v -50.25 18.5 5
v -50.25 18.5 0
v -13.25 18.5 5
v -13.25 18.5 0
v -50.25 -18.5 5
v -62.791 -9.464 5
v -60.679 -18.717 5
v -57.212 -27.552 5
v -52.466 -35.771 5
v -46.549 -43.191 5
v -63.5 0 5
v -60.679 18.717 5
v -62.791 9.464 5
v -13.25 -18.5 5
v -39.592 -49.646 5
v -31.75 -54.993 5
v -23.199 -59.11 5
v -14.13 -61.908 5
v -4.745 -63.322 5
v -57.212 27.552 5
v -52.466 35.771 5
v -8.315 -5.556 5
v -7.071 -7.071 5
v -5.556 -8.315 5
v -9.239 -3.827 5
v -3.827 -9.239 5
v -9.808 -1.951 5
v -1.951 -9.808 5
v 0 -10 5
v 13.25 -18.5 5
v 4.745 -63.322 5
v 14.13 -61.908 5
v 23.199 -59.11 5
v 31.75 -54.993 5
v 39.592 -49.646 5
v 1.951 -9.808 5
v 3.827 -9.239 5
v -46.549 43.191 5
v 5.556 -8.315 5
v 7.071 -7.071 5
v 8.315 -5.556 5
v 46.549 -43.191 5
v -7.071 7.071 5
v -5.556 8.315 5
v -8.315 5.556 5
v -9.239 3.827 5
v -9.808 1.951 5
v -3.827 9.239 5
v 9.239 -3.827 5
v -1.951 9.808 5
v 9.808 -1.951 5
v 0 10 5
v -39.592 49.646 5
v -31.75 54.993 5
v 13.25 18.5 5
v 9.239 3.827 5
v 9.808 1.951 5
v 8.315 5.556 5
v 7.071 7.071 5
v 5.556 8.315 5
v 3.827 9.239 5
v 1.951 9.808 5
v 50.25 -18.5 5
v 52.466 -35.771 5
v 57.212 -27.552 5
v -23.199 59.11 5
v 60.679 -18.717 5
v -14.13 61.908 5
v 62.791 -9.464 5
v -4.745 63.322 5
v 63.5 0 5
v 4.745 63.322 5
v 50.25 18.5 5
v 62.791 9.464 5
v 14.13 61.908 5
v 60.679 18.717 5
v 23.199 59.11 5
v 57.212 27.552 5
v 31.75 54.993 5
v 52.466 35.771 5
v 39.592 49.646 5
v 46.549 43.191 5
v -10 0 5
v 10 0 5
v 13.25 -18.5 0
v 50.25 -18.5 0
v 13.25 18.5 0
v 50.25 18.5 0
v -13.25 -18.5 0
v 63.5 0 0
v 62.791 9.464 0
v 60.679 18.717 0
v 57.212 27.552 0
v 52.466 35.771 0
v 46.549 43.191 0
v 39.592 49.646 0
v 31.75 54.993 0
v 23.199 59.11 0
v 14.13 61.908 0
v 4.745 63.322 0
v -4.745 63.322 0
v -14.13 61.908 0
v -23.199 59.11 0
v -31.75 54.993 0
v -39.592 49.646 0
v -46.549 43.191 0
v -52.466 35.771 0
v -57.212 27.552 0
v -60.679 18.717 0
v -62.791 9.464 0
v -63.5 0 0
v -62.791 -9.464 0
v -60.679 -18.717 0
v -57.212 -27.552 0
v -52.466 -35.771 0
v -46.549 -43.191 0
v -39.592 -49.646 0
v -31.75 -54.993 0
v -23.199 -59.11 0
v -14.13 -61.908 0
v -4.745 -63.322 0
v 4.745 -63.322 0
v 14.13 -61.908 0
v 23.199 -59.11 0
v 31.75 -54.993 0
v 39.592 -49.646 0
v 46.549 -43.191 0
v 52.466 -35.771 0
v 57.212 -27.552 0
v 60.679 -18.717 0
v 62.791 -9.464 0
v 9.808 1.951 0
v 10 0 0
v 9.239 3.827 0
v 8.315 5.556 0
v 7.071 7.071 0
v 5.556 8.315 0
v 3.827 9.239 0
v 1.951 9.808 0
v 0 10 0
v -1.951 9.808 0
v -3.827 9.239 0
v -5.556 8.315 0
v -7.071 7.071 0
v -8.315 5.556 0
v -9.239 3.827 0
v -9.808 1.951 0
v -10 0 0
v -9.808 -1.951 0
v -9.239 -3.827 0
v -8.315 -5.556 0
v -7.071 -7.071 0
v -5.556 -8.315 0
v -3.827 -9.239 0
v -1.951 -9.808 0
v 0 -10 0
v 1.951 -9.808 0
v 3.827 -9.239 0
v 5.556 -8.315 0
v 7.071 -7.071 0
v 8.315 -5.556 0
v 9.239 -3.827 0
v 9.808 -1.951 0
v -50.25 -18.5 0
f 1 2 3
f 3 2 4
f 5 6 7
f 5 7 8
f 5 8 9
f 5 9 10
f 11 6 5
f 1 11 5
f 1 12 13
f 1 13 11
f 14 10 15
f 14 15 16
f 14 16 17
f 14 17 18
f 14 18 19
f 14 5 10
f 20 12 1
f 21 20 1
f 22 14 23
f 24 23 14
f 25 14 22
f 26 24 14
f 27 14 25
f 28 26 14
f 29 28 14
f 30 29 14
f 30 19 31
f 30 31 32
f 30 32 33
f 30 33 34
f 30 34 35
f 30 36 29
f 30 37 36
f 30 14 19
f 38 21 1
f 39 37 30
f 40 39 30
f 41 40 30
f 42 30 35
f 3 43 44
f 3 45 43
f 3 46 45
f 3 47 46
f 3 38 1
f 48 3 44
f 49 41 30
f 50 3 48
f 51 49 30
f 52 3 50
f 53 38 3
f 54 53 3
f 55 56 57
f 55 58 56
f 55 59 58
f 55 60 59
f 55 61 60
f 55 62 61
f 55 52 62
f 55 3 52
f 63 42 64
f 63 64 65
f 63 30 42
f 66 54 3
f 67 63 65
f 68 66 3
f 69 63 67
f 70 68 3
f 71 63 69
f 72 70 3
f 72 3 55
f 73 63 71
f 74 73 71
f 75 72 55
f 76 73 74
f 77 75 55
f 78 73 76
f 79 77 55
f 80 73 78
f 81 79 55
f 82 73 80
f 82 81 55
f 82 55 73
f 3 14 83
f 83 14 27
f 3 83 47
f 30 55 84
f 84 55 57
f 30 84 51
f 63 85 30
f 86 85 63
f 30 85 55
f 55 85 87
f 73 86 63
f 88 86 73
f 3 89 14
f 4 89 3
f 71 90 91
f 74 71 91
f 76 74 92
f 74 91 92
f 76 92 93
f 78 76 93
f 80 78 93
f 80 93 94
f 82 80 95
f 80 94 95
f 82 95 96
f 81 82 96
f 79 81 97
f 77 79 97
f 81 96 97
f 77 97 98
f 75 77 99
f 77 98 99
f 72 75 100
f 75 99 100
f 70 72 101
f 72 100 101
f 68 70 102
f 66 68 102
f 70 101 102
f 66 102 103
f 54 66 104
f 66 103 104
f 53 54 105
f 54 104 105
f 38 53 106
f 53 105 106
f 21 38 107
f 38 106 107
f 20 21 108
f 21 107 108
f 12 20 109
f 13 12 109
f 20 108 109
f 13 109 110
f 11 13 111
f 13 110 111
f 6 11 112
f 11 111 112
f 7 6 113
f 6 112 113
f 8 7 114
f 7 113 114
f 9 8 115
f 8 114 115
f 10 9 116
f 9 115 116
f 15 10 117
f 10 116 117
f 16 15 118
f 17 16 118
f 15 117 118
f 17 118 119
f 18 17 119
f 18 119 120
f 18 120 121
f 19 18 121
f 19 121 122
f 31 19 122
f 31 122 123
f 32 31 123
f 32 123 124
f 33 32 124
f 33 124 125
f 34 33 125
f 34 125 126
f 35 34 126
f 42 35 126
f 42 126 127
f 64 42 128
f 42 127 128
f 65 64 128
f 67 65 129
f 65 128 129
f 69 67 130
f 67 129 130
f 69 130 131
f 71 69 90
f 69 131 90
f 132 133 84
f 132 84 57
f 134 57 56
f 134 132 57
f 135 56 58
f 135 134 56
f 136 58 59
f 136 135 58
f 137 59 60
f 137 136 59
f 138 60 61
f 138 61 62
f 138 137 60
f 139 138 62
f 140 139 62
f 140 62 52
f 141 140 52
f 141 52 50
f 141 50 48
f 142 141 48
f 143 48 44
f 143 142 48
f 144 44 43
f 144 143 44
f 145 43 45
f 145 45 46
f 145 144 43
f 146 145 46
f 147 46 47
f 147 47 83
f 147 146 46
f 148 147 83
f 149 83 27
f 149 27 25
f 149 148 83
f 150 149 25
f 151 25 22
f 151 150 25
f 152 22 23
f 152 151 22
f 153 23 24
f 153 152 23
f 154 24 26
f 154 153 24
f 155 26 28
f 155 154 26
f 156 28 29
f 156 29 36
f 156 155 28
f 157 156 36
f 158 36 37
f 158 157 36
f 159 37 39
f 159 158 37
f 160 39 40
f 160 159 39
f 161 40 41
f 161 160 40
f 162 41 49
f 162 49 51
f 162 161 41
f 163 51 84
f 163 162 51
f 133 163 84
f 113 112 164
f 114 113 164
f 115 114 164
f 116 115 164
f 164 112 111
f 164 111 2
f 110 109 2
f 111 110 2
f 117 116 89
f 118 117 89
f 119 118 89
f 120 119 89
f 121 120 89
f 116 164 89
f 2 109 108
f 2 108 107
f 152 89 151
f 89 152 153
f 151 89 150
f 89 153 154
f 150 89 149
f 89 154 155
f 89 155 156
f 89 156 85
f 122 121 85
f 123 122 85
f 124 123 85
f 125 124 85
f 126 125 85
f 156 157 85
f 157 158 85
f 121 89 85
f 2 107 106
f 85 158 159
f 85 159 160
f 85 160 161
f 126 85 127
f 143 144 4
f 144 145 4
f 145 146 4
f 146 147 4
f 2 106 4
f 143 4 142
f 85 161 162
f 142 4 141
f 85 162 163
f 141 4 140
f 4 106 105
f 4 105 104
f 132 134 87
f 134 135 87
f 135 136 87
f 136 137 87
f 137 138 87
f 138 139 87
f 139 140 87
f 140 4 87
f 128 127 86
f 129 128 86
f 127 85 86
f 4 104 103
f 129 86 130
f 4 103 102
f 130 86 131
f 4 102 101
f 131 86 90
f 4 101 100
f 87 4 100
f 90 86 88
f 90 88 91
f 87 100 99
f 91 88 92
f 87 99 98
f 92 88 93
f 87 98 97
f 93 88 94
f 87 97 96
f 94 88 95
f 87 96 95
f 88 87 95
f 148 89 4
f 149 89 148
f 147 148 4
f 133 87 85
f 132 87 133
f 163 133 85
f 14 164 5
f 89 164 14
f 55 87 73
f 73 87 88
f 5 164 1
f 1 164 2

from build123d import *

# Parameters (mm, degrees)
F0_R     = 63.5
F0_W     = 37
F0_H     = 37
F0_R_2   = 10
F1_DEPTH = 5


with BuildPart() as f1:
    # F0 (on Top) → F1 (new body)
    with BuildSketch(Plane.XY):
        Circle(F0_R)
        with Locations((-31.75, 0)):
            Rectangle(F0_W, F0_H, mode=Mode.SUBTRACT)
        Circle(F0_R_2, mode=Mode.SUBTRACT)
        with Locations((31.75, 0)):
            Rectangle(F0_W, F0_H, mode=Mode.SUBTRACT)
    extrude(amount=F1_DEPTH)


solid = f1.part
